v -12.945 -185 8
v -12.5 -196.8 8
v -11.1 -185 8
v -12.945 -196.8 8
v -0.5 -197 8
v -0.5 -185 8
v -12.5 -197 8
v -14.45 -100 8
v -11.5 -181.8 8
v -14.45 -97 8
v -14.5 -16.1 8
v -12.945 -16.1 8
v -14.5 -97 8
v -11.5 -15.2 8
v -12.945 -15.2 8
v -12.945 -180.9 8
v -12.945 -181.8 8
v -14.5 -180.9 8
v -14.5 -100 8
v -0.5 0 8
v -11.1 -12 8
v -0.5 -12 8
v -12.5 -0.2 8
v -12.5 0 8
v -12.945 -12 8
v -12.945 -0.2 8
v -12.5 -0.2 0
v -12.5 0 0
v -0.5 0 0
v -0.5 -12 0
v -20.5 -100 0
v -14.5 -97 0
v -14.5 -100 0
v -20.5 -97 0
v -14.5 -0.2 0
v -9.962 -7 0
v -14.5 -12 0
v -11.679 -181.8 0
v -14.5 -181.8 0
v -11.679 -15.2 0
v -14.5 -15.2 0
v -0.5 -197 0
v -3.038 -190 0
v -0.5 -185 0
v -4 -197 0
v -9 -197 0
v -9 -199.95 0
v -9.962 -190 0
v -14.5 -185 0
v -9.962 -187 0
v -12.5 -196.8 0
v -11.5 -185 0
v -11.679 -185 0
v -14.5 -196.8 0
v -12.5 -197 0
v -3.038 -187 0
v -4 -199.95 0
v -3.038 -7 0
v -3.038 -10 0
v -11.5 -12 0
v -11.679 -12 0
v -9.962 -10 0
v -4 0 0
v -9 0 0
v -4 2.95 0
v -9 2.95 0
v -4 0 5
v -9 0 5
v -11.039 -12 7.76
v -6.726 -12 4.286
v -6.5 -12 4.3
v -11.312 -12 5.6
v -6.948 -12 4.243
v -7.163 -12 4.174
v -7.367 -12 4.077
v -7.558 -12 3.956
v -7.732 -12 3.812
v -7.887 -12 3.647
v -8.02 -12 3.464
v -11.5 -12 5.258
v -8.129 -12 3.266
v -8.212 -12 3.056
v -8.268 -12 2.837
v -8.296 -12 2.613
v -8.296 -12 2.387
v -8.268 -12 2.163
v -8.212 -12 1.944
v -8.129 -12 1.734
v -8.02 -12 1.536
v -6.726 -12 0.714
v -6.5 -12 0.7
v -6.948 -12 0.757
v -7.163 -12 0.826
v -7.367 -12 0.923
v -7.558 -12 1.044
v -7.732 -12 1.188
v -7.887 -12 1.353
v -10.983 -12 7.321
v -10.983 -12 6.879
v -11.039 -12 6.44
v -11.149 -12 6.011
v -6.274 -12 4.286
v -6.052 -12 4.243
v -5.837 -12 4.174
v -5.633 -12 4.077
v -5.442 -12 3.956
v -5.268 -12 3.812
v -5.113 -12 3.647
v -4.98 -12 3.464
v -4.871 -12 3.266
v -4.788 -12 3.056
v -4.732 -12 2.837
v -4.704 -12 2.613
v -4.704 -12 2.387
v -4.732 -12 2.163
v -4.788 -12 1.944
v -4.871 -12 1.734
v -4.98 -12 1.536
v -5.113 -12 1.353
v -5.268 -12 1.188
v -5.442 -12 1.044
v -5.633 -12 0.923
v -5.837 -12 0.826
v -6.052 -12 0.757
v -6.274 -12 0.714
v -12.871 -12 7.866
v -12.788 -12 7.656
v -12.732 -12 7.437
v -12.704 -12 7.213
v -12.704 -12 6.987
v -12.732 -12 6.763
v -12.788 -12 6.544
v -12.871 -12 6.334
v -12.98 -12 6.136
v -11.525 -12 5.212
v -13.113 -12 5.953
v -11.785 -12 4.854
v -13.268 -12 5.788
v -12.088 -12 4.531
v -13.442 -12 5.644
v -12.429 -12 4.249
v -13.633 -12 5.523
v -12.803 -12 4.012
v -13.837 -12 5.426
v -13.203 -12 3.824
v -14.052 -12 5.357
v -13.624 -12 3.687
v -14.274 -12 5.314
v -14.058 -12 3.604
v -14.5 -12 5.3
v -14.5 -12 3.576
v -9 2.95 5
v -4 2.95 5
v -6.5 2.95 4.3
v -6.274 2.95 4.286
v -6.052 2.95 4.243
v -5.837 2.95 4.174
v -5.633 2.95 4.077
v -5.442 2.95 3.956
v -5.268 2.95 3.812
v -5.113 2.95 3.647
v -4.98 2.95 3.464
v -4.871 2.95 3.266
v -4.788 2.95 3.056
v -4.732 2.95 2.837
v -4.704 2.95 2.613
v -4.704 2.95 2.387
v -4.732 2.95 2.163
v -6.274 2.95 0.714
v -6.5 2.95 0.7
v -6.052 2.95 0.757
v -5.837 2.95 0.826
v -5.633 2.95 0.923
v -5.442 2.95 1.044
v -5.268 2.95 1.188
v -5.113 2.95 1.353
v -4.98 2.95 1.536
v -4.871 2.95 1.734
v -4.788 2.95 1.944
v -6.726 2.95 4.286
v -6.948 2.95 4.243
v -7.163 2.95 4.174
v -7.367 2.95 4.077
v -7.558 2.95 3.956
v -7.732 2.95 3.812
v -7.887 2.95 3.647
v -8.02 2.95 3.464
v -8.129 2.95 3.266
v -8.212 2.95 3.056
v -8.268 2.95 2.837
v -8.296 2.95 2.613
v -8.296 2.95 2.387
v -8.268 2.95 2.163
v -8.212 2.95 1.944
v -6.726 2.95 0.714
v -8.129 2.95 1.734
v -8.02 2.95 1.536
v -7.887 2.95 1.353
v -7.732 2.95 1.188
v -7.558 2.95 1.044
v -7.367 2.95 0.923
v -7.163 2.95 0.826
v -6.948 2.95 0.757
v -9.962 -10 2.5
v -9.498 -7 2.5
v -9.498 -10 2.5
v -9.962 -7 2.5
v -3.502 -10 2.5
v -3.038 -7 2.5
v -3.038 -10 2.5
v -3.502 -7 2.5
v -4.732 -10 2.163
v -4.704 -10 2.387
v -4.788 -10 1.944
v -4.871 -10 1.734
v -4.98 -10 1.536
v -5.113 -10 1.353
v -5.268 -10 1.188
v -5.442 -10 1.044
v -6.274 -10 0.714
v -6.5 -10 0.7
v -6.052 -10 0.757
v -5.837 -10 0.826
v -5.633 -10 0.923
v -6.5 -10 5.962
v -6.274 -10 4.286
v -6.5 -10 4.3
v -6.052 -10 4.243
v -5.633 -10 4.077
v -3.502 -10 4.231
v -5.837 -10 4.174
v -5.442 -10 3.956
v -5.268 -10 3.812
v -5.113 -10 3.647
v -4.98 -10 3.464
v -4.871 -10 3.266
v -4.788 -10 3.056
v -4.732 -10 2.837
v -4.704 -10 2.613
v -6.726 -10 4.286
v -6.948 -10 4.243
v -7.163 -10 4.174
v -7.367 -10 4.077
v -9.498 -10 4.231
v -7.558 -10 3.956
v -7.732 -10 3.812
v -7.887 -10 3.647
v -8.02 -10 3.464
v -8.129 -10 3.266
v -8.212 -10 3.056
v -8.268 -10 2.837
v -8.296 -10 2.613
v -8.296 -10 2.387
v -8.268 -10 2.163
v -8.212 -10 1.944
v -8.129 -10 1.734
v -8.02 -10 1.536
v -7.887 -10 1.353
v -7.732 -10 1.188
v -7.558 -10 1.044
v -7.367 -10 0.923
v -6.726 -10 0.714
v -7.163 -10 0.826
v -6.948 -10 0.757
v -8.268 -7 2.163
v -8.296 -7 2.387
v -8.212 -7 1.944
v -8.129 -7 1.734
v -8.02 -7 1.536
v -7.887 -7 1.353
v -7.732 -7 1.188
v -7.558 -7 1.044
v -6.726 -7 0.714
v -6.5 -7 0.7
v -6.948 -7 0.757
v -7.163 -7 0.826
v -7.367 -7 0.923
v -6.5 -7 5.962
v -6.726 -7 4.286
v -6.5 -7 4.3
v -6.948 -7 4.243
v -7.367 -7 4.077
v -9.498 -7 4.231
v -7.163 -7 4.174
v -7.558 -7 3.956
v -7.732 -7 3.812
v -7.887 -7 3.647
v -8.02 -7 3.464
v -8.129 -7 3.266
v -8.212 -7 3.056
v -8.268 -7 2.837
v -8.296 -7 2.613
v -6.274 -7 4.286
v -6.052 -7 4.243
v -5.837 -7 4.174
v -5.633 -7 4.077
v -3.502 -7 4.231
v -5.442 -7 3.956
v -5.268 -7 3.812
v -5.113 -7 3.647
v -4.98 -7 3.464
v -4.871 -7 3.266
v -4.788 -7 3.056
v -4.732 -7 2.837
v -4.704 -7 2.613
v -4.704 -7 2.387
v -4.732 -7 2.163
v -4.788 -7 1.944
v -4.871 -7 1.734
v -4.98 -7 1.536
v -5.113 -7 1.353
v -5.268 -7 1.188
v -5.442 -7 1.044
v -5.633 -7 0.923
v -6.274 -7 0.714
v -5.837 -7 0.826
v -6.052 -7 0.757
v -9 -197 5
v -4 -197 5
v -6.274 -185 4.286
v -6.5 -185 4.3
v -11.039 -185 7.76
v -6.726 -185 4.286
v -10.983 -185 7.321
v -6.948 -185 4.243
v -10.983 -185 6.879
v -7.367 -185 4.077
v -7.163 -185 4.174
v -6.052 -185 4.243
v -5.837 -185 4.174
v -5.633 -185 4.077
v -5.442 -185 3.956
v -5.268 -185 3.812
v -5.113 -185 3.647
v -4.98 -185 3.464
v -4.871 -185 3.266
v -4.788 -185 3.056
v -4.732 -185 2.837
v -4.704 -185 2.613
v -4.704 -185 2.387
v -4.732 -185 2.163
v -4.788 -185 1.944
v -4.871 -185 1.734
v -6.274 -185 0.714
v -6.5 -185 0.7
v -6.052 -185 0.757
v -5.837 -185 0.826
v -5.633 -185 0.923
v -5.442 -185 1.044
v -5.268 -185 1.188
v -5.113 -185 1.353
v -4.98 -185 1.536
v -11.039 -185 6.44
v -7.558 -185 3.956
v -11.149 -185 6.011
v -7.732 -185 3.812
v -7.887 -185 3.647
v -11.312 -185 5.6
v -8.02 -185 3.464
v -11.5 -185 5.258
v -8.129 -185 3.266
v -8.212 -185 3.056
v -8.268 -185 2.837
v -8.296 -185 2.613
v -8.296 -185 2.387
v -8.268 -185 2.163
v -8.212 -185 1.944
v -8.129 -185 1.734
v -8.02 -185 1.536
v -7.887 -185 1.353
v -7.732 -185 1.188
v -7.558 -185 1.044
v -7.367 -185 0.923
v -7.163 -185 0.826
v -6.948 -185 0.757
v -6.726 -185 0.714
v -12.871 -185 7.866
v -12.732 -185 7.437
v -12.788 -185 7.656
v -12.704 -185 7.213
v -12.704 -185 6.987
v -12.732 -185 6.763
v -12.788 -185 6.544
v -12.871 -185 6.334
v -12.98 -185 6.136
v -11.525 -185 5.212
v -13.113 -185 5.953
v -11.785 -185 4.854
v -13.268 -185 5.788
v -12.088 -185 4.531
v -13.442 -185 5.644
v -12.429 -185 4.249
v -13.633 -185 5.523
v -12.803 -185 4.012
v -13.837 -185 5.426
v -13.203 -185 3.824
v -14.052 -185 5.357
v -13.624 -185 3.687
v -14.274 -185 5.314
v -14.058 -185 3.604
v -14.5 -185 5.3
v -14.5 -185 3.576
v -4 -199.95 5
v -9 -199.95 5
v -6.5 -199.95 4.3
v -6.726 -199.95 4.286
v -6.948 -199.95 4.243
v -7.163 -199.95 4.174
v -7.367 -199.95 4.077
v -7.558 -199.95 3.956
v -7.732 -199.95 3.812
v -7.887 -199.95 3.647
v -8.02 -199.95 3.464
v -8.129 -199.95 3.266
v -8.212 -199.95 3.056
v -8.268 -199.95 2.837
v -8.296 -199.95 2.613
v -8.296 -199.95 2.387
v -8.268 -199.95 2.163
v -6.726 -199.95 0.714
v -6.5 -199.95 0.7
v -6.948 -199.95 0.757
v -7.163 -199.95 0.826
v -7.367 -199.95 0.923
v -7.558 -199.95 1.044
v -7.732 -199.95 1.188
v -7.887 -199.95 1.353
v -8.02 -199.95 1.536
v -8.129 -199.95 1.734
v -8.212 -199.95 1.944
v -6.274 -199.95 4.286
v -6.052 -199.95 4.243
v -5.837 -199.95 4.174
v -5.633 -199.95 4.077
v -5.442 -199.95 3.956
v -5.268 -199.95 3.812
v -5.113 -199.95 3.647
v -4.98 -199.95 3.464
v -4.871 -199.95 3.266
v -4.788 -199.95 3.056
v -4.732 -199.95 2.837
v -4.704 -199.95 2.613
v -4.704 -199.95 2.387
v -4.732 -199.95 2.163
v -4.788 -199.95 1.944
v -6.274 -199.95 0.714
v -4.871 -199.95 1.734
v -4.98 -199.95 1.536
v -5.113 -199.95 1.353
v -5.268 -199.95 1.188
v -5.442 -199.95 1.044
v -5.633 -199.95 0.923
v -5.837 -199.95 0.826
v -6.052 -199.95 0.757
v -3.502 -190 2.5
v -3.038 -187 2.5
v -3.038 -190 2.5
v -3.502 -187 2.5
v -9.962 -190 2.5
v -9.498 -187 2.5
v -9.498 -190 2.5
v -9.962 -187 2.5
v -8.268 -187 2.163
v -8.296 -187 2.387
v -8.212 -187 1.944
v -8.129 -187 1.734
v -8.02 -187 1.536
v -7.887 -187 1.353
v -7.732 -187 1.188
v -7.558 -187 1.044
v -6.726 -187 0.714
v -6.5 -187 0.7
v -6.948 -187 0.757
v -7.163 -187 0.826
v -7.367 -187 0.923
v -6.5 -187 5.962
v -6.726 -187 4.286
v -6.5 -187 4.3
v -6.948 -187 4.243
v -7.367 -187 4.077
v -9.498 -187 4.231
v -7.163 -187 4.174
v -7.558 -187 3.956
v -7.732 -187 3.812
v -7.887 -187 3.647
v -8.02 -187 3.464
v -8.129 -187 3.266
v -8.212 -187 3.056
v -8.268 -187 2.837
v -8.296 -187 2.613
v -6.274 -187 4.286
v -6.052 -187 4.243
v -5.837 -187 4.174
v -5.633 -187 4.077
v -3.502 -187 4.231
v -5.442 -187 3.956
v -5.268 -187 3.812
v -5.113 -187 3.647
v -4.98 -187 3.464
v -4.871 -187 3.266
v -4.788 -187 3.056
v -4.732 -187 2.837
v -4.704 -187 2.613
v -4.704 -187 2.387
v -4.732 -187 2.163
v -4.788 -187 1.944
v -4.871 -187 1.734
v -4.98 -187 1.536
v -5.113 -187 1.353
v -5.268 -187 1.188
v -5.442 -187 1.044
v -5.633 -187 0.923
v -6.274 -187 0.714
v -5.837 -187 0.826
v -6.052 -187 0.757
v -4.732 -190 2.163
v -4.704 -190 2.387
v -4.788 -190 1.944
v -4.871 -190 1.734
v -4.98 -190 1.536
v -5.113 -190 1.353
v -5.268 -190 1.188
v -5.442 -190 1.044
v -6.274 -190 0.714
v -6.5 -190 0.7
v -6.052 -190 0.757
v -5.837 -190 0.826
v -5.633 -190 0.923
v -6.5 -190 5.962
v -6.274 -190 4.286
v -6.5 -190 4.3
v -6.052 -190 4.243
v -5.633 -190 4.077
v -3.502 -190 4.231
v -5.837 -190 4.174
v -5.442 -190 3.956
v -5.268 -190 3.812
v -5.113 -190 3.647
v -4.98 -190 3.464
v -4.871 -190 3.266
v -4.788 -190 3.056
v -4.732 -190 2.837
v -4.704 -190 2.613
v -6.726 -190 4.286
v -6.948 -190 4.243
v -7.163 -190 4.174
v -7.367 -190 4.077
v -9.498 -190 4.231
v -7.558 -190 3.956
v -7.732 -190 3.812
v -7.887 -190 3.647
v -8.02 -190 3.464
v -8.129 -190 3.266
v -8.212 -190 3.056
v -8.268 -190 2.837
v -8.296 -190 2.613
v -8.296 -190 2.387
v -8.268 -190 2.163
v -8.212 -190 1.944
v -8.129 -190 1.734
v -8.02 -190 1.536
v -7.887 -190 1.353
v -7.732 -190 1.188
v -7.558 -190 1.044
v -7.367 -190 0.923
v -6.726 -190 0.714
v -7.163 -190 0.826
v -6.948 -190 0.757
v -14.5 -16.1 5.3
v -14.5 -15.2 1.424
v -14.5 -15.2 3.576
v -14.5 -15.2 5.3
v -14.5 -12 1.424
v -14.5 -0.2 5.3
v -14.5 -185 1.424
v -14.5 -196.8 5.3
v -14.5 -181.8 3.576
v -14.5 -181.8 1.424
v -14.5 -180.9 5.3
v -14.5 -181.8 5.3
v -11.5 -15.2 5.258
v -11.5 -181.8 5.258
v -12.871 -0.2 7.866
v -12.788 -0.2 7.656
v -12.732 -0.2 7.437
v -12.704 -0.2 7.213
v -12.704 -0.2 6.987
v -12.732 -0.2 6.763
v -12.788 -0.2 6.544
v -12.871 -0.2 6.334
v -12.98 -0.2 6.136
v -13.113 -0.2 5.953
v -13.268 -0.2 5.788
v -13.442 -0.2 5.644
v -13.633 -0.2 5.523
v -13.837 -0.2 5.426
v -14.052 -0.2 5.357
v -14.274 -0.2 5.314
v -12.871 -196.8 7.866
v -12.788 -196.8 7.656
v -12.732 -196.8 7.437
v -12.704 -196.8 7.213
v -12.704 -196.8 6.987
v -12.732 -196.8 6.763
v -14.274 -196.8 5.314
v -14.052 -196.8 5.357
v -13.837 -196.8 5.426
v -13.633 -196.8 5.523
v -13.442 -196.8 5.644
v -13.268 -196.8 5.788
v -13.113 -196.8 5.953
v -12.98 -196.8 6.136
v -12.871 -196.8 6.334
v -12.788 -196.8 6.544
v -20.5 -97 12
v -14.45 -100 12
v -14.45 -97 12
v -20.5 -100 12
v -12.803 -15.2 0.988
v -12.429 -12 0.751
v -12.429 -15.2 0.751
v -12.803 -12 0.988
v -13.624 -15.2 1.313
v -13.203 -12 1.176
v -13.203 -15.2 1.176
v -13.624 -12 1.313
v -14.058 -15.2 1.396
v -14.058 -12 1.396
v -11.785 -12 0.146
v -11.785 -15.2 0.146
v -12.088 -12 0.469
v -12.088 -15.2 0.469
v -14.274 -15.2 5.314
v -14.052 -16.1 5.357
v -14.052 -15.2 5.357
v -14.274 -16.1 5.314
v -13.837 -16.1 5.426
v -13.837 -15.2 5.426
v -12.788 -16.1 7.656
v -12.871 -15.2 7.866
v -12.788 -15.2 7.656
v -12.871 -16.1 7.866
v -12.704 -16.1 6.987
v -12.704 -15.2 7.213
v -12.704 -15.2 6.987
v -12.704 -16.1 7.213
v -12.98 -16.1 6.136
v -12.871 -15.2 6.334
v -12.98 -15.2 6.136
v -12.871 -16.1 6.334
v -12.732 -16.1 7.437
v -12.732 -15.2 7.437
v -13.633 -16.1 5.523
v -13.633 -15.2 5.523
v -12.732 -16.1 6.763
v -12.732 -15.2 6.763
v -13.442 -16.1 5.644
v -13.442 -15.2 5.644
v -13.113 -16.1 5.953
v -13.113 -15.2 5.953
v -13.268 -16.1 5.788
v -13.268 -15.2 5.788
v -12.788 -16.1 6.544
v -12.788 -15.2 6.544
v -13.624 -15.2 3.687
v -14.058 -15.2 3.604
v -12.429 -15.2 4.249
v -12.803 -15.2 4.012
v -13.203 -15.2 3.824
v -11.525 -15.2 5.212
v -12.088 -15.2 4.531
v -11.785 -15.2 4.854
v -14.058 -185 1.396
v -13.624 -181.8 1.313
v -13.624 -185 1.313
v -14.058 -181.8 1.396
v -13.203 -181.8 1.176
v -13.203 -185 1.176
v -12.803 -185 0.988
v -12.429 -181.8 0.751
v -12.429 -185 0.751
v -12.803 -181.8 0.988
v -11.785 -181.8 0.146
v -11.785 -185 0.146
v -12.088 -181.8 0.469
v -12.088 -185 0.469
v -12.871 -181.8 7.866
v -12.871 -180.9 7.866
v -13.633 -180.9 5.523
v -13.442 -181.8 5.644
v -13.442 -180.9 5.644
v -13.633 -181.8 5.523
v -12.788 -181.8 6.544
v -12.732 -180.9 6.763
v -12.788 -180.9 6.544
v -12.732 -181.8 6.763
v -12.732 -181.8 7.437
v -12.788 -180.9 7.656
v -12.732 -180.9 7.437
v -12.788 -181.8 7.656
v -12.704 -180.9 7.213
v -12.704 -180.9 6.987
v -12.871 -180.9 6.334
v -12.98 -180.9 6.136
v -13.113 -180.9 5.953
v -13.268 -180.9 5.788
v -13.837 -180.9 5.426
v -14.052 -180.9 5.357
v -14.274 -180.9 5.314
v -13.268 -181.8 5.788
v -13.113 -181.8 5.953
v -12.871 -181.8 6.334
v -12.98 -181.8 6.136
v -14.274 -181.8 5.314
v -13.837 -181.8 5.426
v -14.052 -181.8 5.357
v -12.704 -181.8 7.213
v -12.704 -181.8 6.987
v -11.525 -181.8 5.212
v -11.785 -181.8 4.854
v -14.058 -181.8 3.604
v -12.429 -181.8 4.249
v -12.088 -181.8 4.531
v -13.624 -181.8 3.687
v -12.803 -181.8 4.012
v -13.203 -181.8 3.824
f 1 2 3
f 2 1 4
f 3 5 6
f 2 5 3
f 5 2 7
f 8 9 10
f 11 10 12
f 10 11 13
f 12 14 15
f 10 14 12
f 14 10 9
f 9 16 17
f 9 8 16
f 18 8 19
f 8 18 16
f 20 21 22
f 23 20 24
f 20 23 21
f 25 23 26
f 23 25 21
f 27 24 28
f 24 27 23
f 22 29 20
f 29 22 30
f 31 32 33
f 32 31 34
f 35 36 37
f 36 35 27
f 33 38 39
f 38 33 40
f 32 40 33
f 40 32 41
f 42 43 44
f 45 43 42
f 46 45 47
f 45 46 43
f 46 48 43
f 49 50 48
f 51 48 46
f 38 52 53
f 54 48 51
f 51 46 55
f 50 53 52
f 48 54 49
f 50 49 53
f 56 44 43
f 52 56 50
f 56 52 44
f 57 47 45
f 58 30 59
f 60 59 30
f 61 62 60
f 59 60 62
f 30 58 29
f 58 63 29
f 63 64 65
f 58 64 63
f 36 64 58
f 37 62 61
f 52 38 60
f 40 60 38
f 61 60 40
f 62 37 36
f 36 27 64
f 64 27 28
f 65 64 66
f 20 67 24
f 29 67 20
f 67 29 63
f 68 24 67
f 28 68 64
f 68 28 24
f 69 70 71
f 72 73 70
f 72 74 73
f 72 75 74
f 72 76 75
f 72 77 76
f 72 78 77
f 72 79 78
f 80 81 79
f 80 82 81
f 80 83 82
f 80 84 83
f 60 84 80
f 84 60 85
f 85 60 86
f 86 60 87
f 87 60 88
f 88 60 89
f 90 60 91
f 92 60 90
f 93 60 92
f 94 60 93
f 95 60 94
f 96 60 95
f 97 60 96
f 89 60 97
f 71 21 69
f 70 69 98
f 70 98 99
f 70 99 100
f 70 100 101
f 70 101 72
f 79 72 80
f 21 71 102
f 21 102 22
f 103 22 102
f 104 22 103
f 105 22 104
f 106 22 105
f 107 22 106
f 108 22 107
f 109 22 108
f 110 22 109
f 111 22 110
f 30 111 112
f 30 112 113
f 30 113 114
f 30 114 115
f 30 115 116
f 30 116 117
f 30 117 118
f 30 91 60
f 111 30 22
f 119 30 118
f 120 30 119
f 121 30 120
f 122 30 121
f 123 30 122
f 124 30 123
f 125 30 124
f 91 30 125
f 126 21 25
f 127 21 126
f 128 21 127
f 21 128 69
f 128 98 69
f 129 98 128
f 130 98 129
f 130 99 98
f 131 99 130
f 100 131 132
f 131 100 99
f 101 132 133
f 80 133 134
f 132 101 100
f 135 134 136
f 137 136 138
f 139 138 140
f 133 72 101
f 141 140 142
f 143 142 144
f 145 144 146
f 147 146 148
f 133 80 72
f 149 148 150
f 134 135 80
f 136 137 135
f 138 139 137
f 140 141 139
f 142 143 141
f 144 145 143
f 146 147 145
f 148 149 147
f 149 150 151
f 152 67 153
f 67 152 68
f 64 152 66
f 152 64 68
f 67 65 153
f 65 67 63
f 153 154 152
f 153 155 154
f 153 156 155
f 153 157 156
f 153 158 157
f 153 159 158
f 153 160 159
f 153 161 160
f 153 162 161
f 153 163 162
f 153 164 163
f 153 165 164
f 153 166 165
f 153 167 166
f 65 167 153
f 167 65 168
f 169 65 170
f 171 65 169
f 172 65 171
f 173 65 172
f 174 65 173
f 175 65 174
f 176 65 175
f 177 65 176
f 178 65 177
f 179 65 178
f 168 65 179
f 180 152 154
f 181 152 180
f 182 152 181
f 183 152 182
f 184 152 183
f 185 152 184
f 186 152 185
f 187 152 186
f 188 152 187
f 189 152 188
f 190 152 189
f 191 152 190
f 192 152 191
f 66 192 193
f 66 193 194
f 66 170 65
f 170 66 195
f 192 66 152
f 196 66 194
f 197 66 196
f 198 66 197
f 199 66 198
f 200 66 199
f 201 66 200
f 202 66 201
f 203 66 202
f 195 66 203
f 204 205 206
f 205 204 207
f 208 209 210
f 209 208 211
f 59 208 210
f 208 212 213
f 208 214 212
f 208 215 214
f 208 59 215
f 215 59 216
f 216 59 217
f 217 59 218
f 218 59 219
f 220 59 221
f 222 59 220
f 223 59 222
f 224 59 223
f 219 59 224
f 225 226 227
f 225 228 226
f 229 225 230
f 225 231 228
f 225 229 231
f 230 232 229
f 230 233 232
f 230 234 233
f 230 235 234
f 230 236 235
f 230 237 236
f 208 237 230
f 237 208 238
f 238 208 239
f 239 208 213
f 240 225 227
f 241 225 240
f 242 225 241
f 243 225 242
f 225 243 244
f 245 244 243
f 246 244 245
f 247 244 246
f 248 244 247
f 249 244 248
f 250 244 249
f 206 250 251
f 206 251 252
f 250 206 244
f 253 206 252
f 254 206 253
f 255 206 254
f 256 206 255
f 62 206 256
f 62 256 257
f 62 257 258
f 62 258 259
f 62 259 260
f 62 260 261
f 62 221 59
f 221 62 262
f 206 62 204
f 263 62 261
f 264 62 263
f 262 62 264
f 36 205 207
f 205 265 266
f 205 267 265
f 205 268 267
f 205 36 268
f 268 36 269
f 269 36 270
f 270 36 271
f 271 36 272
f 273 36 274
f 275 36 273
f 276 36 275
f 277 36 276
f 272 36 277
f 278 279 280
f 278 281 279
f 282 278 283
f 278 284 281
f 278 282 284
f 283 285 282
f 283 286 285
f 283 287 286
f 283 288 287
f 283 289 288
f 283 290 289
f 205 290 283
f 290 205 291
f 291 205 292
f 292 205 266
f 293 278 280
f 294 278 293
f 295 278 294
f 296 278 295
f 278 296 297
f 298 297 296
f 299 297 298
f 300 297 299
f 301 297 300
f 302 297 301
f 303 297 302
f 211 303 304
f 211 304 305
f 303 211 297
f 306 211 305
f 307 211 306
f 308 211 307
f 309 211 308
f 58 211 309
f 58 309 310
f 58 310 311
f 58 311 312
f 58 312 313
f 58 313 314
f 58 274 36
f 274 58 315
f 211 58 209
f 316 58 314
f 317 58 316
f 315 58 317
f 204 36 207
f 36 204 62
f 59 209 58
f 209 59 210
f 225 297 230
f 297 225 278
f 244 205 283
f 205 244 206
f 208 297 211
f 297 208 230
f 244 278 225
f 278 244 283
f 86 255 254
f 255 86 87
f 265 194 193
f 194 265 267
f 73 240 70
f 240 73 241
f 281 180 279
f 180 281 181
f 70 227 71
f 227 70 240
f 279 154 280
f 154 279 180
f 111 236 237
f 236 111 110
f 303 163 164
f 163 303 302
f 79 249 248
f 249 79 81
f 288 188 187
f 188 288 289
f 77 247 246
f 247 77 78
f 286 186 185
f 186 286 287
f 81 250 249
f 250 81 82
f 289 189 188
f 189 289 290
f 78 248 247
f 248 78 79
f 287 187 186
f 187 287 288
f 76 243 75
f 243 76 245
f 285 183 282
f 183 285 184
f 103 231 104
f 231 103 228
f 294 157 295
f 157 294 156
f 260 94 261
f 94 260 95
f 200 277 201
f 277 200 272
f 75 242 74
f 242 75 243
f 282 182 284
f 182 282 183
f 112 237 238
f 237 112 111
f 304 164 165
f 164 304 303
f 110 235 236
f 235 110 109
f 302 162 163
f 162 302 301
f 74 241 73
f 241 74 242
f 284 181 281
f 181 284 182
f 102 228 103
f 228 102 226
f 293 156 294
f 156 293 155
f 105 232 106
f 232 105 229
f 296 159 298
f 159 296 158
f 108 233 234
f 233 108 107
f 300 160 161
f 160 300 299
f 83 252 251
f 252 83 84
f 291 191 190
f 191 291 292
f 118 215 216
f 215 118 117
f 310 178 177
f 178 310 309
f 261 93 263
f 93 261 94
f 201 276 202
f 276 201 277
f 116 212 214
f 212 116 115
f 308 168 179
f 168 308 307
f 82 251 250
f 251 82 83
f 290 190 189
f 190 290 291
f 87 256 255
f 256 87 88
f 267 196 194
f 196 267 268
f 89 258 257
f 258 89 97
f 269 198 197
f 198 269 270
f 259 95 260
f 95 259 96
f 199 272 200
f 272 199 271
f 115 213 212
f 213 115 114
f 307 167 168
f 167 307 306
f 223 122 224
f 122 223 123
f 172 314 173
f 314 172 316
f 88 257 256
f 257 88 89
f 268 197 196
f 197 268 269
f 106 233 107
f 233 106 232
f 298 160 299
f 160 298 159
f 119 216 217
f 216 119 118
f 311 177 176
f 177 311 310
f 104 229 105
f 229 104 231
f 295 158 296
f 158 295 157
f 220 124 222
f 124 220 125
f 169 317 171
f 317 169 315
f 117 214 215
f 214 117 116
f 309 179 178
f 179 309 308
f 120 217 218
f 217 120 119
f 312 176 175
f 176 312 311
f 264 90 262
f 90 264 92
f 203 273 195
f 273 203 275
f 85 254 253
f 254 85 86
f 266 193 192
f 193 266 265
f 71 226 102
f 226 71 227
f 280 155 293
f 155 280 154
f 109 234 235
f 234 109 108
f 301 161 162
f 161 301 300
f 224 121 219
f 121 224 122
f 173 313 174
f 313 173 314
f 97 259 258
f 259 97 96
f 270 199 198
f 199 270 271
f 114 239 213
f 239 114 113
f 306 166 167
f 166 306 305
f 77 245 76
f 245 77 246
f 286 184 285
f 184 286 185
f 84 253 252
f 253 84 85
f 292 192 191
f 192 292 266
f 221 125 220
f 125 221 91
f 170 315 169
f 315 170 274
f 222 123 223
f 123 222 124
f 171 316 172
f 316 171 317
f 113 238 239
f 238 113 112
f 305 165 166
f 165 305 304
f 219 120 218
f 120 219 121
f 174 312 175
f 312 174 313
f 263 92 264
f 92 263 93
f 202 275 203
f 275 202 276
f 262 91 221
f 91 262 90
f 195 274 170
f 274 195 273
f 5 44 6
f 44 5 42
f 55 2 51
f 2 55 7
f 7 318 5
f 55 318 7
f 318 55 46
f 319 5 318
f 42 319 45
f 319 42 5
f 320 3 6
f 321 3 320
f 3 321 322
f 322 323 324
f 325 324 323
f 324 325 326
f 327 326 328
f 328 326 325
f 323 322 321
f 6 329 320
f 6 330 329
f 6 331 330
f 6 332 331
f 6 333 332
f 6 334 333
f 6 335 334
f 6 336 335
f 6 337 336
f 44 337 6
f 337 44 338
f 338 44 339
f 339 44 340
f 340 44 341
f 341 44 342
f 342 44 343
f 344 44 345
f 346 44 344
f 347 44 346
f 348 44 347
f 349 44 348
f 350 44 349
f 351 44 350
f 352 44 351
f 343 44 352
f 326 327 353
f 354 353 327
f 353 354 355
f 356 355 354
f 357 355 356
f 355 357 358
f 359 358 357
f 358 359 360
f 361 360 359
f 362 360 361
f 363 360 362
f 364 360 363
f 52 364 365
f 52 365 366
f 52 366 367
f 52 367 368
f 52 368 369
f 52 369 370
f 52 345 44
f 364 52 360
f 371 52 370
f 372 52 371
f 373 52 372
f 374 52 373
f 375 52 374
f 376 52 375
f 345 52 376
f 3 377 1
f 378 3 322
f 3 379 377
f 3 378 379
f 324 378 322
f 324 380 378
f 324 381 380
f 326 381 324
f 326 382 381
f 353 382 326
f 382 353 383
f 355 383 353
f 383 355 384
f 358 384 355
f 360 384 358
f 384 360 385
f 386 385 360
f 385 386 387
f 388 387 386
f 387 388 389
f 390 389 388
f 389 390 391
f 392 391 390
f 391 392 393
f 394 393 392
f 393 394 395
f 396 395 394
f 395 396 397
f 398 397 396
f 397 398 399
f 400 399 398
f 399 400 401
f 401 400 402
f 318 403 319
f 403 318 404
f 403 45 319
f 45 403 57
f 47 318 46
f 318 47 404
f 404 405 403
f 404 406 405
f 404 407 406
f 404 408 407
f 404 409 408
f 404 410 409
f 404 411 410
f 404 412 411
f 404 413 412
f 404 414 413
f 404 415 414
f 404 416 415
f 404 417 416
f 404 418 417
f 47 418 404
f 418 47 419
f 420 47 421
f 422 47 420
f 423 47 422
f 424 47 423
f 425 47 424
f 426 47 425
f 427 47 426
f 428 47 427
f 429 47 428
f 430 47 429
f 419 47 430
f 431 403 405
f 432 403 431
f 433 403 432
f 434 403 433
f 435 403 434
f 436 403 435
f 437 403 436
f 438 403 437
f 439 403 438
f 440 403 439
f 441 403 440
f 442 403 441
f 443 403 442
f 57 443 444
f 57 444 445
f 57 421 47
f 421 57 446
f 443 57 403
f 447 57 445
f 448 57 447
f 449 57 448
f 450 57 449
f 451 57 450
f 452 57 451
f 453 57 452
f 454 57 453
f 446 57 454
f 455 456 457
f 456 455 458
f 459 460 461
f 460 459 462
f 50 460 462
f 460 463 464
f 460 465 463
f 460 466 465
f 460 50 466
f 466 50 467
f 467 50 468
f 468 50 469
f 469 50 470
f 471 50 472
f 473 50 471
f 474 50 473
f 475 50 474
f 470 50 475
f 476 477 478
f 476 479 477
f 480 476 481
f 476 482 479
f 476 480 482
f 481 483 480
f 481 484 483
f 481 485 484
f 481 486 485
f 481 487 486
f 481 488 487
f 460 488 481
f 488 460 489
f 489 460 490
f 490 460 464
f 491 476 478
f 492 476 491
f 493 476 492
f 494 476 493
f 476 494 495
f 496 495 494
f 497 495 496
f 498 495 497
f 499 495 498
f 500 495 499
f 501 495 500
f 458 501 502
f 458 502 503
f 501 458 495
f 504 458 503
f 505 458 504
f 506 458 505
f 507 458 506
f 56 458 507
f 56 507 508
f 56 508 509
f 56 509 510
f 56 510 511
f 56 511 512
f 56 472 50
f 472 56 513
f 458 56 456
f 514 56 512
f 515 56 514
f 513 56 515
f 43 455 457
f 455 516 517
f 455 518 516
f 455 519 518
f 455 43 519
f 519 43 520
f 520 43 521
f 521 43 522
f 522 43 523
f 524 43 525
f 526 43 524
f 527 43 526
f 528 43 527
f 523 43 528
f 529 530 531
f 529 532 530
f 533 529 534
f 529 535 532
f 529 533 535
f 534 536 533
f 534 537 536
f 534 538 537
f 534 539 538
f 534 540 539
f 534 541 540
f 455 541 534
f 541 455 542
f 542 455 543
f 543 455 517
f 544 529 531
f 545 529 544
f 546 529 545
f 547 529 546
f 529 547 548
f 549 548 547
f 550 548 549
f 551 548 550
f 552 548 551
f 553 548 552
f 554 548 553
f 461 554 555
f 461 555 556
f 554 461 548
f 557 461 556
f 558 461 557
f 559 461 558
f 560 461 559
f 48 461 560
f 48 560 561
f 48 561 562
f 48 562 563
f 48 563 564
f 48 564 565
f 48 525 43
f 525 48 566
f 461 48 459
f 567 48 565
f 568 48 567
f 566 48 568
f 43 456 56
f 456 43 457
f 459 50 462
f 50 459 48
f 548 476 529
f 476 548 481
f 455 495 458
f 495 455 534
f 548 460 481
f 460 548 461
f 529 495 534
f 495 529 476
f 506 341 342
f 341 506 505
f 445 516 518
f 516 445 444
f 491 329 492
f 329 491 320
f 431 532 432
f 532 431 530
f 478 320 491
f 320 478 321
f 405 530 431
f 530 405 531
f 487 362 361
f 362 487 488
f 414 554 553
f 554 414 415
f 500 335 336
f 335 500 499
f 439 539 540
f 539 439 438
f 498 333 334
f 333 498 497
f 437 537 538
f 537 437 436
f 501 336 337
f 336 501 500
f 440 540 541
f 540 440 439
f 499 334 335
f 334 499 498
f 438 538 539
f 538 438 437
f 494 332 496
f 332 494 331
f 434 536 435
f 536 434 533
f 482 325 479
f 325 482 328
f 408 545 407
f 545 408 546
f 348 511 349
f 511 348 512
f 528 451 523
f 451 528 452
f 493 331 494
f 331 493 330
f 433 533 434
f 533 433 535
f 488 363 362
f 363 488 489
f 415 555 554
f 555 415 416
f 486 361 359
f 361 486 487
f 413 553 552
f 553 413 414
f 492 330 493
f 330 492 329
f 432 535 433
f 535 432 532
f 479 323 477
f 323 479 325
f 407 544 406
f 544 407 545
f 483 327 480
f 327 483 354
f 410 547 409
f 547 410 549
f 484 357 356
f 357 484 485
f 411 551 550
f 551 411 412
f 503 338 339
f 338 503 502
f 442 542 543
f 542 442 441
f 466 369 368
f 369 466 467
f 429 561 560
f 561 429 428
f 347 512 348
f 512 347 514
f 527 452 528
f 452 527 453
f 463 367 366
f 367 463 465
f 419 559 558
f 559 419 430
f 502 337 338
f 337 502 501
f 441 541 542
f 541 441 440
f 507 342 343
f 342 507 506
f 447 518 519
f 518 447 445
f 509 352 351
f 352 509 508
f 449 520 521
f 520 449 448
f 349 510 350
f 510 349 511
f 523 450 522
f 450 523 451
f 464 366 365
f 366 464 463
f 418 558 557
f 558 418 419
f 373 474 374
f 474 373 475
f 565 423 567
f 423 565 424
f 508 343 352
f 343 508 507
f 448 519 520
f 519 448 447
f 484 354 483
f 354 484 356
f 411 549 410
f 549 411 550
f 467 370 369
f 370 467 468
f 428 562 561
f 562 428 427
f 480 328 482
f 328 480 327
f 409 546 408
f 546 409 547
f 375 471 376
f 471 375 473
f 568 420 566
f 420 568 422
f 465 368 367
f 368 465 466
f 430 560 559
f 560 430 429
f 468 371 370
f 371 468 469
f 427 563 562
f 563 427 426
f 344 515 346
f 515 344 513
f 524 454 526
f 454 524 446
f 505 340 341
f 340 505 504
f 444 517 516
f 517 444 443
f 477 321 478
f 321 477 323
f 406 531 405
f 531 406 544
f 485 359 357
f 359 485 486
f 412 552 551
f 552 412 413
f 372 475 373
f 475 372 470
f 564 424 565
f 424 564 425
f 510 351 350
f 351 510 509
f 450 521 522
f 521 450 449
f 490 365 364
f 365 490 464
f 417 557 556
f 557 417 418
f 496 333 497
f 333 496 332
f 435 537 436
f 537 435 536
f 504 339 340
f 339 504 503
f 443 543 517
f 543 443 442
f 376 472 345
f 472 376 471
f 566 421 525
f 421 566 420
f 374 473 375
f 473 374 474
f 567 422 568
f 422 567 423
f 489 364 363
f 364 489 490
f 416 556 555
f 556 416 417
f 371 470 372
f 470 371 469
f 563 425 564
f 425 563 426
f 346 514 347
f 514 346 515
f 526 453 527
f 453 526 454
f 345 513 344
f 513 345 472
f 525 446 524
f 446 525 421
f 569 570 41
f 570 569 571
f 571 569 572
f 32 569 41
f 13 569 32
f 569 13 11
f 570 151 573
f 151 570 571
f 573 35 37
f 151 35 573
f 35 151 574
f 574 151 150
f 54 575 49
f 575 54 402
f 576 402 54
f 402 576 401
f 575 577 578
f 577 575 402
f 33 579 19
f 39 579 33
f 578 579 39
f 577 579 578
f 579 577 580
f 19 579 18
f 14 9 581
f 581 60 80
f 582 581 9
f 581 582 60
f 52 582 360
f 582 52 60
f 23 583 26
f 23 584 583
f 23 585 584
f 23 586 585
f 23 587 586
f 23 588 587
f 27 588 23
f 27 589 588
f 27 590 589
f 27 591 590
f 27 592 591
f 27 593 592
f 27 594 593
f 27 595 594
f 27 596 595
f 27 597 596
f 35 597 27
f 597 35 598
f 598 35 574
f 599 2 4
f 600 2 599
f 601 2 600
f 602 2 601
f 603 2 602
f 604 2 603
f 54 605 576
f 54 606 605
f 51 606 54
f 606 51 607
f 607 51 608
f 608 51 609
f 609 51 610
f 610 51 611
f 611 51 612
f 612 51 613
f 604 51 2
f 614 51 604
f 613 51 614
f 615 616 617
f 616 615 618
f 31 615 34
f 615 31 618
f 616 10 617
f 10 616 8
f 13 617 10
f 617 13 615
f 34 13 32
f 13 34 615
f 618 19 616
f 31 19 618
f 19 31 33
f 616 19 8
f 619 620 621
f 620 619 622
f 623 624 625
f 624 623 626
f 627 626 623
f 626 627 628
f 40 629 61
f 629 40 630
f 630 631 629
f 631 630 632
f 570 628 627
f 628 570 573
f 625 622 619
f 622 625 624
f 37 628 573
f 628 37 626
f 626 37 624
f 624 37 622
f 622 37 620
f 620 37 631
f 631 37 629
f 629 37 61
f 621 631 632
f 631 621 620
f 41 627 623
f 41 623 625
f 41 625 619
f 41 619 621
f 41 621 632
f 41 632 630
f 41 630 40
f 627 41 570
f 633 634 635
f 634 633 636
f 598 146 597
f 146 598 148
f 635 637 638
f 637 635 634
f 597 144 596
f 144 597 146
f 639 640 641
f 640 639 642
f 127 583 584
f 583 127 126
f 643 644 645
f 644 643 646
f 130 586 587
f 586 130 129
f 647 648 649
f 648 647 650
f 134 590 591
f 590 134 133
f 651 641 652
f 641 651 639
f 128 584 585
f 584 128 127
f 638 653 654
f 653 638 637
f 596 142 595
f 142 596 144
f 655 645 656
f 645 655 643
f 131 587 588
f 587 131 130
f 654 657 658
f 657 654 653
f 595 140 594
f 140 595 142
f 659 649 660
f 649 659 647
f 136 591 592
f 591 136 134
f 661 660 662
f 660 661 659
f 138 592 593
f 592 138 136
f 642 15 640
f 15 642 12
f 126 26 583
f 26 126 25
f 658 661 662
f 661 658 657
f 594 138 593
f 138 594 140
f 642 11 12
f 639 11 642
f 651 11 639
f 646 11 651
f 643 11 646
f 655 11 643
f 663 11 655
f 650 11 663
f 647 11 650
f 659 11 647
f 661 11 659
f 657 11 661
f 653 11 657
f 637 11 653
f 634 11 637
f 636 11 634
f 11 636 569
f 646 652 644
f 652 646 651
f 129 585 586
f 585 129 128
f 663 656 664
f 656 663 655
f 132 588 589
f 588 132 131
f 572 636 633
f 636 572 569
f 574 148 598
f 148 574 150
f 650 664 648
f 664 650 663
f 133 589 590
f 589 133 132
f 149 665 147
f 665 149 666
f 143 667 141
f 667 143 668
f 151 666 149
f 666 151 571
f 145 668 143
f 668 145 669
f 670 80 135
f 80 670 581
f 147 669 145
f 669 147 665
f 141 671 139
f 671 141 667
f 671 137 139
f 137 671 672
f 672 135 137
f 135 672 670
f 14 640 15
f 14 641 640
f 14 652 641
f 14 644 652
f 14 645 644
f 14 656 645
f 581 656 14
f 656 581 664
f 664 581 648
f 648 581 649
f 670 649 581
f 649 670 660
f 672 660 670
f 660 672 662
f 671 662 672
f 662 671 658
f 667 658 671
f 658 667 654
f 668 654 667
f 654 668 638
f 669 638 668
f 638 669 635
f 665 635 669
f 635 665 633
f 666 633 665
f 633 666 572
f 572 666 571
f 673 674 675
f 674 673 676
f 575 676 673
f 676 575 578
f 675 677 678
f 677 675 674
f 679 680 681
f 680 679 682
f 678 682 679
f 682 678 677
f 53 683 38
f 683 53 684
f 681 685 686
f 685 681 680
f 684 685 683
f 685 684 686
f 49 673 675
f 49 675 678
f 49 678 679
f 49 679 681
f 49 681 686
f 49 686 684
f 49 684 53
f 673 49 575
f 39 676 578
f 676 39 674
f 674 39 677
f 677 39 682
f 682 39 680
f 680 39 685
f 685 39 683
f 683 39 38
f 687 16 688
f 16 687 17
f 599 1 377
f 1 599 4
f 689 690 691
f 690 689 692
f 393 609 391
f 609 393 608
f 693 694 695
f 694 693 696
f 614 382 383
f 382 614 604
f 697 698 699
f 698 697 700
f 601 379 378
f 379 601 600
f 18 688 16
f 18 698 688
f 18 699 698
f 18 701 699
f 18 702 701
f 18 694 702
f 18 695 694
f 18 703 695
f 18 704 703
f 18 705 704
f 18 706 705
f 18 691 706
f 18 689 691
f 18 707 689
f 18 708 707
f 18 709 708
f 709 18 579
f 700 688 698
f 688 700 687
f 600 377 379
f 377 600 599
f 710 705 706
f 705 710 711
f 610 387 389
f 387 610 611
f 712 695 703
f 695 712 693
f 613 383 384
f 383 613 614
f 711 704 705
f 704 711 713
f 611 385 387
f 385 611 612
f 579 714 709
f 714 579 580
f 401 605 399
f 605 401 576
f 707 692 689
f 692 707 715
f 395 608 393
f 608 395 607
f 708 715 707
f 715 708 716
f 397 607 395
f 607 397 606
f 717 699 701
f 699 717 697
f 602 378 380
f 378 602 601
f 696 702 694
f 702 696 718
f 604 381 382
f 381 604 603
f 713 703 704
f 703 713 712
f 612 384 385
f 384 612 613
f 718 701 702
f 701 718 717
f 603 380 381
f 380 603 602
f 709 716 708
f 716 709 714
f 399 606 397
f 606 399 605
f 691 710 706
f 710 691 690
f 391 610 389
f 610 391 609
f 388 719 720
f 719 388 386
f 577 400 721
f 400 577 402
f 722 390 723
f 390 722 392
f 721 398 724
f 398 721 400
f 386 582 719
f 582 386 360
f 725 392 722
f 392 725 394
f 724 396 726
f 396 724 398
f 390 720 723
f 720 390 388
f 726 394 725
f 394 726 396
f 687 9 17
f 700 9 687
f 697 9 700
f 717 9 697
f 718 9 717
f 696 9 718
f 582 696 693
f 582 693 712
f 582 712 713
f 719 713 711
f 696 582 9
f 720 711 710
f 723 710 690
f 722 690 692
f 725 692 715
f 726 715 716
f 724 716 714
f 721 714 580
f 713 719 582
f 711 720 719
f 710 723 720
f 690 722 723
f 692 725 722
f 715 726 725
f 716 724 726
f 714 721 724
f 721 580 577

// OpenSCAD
$fn = 50;

difference() {
	union() {
		translate(v = [0, 0, 0]) {
			rotate(a = [0, 0, 0]) {
				difference() {
					union() {
						translate(v = [0, 0, 2.5]) {
							rotate(a = [0, -90, 0]) {
								difference() {
									union() {
										translate(v = [0, 0, 0]) {
											rotate(a = [0, 0, 0]) {
												difference() {
													union() {
														translate(v = [-2.5, -12.0, 0.5]) {
															cube(size = [8.0, 12.0, 12.0]);
														}
														translate(v = [-2.5, -0.05, 4.0]) {
															cube(size = [5.0, 3.0, 5.0]);
														}
													}
													union() {
														translate(v = [0, -7.0, 6.5]) {
															rotate(a = [90, 0, 0]) {
																difference() {
																	union() {
																		translate(v = [-20.0, -3.4619999999999997, 0]) {
																			cube(size = [20, 6.9239999999999995, 3]);
																		}
																		linear_extrude(height = 3) {
																			polygon(points = [[3.4619999999999997, 0.0], [1.7310000000000003, 2.9981799479017264], [-1.7309999999999992, 2.9981799479017264], [-3.4619999999999997, 4.2397272186481365e-16], [-1.7310000000000014, -2.998179947901726], [1.7309999999999977, -2.9981799479017277]]);
																		}
																	}
																	union();
																}
															}
														}
														translate(v = [0, 3.0500000000000003, 6.5]) {
															rotate(a = [90, 0, 0]) {
																cylinder(h = 22.95, r = 1.8);
															}
														}
													}
												}
											}
										}
										translate(v = [0, -197.0, 13.0]) {
											rotate(a = [180, 0, 0]) {
												difference() {
													union() {
														translate(v = [-2.5, -12.0, 0.5]) {
															cube(size = [8.0, 12.0, 12.0]);
														}
														translate(v = [-2.5, -0.05, 4.0]) {
															cube(size = [5.0, 3.0, 5.0]);
														}
													}
													union() {
														translate(v = [0, -7.0, 6.5]) {
															rotate(a = [90, 0, 0]) {
																difference() {
																	union() {
																		translate(v = [-20.0, -3.4619999999999997, 0]) {
																			cube(size = [20, 6.9239999999999995, 3]);
																		}
																		linear_extrude(height = 3) {
																			polygon(points = [[3.4619999999999997, 0.0], [1.7310000000000003, 2.9981799479017264], [-1.7309999999999992, 2.9981799479017264], [-3.4619999999999997, 4.2397272186481365e-16], [-1.7310000000000014, -2.998179947901726], [1.7309999999999977, -2.9981799479017277]]);
																		}
																	}
																	union();
																}
															}
														}
														translate(v = [0, 3.0500000000000003, 6.5]) {
															rotate(a = [90, 0, 0]) {
																cylinder(h = 22.95, r = 1.8);
															}
														}
													}
												}
											}
										}
										translate(v = [-2.5, -196.8, 11.5]) {
											cube(size = [8.0, 196.6, 3.0]);
										}
										translate(v = [-2.5, -100.0, 14.45]) {
											cube(size = [12.0, 3.0, 6.05]);
										}
									}
									union() {
										translate(v = [-4.600000000499989, 0.1, 14.5]) {
											rotate(a = [90, 0, 0]) {
												cylinder(h = 16.2, r = 1.8);
											}
										}
										translate(v = [-4.600000000499989, -12.0, 14.5]) {
											rotate(a = [90, 0, 0]) {
												cylinder(h = 3.2, r = 3.5235);
											}
										}
										translate(v = [4.600000000499989, 0.1, 14.5]) {
											rotate(a = [90, 0, 0]) {
												cylinder(h = 16.2, r = 1.8);
											}
										}
										translate(v = [4.600000000499989, -12.0, 14.5]) {
											rotate(a = [90, 0, 0]) {
												cylinder(h = 3.2, r = 3.5235);
											}
										}
										translate(v = [-4.600000000499989, -197.1, 14.5]) {
											rotate(a = [-90, 0, 0]) {
												cylinder(h = 16.2, r = 1.8);
											}
										}
										translate(v = [-4.600000000499989, -185.0, 14.5]) {
											rotate(a = [-90, 0, 0]) {
												cylinder(h = 3.2, r = 3.5235);
											}
										}
										translate(v = [4.600000000499989, -197.1, 14.5]) {
											rotate(a = [-90, 0, 0]) {
												cylinder(h = 16.2, r = 1.8);
											}
										}
										translate(v = [4.600000000499989, -185.0, 14.5]) {
											rotate(a = [-90, 0, 0]) {
												cylinder(h = 3.2, r = 3.5235);
											}
										}
									}
								}
							}
						}
					}
					union();
				}
			}
		}
	}
	union();
}
